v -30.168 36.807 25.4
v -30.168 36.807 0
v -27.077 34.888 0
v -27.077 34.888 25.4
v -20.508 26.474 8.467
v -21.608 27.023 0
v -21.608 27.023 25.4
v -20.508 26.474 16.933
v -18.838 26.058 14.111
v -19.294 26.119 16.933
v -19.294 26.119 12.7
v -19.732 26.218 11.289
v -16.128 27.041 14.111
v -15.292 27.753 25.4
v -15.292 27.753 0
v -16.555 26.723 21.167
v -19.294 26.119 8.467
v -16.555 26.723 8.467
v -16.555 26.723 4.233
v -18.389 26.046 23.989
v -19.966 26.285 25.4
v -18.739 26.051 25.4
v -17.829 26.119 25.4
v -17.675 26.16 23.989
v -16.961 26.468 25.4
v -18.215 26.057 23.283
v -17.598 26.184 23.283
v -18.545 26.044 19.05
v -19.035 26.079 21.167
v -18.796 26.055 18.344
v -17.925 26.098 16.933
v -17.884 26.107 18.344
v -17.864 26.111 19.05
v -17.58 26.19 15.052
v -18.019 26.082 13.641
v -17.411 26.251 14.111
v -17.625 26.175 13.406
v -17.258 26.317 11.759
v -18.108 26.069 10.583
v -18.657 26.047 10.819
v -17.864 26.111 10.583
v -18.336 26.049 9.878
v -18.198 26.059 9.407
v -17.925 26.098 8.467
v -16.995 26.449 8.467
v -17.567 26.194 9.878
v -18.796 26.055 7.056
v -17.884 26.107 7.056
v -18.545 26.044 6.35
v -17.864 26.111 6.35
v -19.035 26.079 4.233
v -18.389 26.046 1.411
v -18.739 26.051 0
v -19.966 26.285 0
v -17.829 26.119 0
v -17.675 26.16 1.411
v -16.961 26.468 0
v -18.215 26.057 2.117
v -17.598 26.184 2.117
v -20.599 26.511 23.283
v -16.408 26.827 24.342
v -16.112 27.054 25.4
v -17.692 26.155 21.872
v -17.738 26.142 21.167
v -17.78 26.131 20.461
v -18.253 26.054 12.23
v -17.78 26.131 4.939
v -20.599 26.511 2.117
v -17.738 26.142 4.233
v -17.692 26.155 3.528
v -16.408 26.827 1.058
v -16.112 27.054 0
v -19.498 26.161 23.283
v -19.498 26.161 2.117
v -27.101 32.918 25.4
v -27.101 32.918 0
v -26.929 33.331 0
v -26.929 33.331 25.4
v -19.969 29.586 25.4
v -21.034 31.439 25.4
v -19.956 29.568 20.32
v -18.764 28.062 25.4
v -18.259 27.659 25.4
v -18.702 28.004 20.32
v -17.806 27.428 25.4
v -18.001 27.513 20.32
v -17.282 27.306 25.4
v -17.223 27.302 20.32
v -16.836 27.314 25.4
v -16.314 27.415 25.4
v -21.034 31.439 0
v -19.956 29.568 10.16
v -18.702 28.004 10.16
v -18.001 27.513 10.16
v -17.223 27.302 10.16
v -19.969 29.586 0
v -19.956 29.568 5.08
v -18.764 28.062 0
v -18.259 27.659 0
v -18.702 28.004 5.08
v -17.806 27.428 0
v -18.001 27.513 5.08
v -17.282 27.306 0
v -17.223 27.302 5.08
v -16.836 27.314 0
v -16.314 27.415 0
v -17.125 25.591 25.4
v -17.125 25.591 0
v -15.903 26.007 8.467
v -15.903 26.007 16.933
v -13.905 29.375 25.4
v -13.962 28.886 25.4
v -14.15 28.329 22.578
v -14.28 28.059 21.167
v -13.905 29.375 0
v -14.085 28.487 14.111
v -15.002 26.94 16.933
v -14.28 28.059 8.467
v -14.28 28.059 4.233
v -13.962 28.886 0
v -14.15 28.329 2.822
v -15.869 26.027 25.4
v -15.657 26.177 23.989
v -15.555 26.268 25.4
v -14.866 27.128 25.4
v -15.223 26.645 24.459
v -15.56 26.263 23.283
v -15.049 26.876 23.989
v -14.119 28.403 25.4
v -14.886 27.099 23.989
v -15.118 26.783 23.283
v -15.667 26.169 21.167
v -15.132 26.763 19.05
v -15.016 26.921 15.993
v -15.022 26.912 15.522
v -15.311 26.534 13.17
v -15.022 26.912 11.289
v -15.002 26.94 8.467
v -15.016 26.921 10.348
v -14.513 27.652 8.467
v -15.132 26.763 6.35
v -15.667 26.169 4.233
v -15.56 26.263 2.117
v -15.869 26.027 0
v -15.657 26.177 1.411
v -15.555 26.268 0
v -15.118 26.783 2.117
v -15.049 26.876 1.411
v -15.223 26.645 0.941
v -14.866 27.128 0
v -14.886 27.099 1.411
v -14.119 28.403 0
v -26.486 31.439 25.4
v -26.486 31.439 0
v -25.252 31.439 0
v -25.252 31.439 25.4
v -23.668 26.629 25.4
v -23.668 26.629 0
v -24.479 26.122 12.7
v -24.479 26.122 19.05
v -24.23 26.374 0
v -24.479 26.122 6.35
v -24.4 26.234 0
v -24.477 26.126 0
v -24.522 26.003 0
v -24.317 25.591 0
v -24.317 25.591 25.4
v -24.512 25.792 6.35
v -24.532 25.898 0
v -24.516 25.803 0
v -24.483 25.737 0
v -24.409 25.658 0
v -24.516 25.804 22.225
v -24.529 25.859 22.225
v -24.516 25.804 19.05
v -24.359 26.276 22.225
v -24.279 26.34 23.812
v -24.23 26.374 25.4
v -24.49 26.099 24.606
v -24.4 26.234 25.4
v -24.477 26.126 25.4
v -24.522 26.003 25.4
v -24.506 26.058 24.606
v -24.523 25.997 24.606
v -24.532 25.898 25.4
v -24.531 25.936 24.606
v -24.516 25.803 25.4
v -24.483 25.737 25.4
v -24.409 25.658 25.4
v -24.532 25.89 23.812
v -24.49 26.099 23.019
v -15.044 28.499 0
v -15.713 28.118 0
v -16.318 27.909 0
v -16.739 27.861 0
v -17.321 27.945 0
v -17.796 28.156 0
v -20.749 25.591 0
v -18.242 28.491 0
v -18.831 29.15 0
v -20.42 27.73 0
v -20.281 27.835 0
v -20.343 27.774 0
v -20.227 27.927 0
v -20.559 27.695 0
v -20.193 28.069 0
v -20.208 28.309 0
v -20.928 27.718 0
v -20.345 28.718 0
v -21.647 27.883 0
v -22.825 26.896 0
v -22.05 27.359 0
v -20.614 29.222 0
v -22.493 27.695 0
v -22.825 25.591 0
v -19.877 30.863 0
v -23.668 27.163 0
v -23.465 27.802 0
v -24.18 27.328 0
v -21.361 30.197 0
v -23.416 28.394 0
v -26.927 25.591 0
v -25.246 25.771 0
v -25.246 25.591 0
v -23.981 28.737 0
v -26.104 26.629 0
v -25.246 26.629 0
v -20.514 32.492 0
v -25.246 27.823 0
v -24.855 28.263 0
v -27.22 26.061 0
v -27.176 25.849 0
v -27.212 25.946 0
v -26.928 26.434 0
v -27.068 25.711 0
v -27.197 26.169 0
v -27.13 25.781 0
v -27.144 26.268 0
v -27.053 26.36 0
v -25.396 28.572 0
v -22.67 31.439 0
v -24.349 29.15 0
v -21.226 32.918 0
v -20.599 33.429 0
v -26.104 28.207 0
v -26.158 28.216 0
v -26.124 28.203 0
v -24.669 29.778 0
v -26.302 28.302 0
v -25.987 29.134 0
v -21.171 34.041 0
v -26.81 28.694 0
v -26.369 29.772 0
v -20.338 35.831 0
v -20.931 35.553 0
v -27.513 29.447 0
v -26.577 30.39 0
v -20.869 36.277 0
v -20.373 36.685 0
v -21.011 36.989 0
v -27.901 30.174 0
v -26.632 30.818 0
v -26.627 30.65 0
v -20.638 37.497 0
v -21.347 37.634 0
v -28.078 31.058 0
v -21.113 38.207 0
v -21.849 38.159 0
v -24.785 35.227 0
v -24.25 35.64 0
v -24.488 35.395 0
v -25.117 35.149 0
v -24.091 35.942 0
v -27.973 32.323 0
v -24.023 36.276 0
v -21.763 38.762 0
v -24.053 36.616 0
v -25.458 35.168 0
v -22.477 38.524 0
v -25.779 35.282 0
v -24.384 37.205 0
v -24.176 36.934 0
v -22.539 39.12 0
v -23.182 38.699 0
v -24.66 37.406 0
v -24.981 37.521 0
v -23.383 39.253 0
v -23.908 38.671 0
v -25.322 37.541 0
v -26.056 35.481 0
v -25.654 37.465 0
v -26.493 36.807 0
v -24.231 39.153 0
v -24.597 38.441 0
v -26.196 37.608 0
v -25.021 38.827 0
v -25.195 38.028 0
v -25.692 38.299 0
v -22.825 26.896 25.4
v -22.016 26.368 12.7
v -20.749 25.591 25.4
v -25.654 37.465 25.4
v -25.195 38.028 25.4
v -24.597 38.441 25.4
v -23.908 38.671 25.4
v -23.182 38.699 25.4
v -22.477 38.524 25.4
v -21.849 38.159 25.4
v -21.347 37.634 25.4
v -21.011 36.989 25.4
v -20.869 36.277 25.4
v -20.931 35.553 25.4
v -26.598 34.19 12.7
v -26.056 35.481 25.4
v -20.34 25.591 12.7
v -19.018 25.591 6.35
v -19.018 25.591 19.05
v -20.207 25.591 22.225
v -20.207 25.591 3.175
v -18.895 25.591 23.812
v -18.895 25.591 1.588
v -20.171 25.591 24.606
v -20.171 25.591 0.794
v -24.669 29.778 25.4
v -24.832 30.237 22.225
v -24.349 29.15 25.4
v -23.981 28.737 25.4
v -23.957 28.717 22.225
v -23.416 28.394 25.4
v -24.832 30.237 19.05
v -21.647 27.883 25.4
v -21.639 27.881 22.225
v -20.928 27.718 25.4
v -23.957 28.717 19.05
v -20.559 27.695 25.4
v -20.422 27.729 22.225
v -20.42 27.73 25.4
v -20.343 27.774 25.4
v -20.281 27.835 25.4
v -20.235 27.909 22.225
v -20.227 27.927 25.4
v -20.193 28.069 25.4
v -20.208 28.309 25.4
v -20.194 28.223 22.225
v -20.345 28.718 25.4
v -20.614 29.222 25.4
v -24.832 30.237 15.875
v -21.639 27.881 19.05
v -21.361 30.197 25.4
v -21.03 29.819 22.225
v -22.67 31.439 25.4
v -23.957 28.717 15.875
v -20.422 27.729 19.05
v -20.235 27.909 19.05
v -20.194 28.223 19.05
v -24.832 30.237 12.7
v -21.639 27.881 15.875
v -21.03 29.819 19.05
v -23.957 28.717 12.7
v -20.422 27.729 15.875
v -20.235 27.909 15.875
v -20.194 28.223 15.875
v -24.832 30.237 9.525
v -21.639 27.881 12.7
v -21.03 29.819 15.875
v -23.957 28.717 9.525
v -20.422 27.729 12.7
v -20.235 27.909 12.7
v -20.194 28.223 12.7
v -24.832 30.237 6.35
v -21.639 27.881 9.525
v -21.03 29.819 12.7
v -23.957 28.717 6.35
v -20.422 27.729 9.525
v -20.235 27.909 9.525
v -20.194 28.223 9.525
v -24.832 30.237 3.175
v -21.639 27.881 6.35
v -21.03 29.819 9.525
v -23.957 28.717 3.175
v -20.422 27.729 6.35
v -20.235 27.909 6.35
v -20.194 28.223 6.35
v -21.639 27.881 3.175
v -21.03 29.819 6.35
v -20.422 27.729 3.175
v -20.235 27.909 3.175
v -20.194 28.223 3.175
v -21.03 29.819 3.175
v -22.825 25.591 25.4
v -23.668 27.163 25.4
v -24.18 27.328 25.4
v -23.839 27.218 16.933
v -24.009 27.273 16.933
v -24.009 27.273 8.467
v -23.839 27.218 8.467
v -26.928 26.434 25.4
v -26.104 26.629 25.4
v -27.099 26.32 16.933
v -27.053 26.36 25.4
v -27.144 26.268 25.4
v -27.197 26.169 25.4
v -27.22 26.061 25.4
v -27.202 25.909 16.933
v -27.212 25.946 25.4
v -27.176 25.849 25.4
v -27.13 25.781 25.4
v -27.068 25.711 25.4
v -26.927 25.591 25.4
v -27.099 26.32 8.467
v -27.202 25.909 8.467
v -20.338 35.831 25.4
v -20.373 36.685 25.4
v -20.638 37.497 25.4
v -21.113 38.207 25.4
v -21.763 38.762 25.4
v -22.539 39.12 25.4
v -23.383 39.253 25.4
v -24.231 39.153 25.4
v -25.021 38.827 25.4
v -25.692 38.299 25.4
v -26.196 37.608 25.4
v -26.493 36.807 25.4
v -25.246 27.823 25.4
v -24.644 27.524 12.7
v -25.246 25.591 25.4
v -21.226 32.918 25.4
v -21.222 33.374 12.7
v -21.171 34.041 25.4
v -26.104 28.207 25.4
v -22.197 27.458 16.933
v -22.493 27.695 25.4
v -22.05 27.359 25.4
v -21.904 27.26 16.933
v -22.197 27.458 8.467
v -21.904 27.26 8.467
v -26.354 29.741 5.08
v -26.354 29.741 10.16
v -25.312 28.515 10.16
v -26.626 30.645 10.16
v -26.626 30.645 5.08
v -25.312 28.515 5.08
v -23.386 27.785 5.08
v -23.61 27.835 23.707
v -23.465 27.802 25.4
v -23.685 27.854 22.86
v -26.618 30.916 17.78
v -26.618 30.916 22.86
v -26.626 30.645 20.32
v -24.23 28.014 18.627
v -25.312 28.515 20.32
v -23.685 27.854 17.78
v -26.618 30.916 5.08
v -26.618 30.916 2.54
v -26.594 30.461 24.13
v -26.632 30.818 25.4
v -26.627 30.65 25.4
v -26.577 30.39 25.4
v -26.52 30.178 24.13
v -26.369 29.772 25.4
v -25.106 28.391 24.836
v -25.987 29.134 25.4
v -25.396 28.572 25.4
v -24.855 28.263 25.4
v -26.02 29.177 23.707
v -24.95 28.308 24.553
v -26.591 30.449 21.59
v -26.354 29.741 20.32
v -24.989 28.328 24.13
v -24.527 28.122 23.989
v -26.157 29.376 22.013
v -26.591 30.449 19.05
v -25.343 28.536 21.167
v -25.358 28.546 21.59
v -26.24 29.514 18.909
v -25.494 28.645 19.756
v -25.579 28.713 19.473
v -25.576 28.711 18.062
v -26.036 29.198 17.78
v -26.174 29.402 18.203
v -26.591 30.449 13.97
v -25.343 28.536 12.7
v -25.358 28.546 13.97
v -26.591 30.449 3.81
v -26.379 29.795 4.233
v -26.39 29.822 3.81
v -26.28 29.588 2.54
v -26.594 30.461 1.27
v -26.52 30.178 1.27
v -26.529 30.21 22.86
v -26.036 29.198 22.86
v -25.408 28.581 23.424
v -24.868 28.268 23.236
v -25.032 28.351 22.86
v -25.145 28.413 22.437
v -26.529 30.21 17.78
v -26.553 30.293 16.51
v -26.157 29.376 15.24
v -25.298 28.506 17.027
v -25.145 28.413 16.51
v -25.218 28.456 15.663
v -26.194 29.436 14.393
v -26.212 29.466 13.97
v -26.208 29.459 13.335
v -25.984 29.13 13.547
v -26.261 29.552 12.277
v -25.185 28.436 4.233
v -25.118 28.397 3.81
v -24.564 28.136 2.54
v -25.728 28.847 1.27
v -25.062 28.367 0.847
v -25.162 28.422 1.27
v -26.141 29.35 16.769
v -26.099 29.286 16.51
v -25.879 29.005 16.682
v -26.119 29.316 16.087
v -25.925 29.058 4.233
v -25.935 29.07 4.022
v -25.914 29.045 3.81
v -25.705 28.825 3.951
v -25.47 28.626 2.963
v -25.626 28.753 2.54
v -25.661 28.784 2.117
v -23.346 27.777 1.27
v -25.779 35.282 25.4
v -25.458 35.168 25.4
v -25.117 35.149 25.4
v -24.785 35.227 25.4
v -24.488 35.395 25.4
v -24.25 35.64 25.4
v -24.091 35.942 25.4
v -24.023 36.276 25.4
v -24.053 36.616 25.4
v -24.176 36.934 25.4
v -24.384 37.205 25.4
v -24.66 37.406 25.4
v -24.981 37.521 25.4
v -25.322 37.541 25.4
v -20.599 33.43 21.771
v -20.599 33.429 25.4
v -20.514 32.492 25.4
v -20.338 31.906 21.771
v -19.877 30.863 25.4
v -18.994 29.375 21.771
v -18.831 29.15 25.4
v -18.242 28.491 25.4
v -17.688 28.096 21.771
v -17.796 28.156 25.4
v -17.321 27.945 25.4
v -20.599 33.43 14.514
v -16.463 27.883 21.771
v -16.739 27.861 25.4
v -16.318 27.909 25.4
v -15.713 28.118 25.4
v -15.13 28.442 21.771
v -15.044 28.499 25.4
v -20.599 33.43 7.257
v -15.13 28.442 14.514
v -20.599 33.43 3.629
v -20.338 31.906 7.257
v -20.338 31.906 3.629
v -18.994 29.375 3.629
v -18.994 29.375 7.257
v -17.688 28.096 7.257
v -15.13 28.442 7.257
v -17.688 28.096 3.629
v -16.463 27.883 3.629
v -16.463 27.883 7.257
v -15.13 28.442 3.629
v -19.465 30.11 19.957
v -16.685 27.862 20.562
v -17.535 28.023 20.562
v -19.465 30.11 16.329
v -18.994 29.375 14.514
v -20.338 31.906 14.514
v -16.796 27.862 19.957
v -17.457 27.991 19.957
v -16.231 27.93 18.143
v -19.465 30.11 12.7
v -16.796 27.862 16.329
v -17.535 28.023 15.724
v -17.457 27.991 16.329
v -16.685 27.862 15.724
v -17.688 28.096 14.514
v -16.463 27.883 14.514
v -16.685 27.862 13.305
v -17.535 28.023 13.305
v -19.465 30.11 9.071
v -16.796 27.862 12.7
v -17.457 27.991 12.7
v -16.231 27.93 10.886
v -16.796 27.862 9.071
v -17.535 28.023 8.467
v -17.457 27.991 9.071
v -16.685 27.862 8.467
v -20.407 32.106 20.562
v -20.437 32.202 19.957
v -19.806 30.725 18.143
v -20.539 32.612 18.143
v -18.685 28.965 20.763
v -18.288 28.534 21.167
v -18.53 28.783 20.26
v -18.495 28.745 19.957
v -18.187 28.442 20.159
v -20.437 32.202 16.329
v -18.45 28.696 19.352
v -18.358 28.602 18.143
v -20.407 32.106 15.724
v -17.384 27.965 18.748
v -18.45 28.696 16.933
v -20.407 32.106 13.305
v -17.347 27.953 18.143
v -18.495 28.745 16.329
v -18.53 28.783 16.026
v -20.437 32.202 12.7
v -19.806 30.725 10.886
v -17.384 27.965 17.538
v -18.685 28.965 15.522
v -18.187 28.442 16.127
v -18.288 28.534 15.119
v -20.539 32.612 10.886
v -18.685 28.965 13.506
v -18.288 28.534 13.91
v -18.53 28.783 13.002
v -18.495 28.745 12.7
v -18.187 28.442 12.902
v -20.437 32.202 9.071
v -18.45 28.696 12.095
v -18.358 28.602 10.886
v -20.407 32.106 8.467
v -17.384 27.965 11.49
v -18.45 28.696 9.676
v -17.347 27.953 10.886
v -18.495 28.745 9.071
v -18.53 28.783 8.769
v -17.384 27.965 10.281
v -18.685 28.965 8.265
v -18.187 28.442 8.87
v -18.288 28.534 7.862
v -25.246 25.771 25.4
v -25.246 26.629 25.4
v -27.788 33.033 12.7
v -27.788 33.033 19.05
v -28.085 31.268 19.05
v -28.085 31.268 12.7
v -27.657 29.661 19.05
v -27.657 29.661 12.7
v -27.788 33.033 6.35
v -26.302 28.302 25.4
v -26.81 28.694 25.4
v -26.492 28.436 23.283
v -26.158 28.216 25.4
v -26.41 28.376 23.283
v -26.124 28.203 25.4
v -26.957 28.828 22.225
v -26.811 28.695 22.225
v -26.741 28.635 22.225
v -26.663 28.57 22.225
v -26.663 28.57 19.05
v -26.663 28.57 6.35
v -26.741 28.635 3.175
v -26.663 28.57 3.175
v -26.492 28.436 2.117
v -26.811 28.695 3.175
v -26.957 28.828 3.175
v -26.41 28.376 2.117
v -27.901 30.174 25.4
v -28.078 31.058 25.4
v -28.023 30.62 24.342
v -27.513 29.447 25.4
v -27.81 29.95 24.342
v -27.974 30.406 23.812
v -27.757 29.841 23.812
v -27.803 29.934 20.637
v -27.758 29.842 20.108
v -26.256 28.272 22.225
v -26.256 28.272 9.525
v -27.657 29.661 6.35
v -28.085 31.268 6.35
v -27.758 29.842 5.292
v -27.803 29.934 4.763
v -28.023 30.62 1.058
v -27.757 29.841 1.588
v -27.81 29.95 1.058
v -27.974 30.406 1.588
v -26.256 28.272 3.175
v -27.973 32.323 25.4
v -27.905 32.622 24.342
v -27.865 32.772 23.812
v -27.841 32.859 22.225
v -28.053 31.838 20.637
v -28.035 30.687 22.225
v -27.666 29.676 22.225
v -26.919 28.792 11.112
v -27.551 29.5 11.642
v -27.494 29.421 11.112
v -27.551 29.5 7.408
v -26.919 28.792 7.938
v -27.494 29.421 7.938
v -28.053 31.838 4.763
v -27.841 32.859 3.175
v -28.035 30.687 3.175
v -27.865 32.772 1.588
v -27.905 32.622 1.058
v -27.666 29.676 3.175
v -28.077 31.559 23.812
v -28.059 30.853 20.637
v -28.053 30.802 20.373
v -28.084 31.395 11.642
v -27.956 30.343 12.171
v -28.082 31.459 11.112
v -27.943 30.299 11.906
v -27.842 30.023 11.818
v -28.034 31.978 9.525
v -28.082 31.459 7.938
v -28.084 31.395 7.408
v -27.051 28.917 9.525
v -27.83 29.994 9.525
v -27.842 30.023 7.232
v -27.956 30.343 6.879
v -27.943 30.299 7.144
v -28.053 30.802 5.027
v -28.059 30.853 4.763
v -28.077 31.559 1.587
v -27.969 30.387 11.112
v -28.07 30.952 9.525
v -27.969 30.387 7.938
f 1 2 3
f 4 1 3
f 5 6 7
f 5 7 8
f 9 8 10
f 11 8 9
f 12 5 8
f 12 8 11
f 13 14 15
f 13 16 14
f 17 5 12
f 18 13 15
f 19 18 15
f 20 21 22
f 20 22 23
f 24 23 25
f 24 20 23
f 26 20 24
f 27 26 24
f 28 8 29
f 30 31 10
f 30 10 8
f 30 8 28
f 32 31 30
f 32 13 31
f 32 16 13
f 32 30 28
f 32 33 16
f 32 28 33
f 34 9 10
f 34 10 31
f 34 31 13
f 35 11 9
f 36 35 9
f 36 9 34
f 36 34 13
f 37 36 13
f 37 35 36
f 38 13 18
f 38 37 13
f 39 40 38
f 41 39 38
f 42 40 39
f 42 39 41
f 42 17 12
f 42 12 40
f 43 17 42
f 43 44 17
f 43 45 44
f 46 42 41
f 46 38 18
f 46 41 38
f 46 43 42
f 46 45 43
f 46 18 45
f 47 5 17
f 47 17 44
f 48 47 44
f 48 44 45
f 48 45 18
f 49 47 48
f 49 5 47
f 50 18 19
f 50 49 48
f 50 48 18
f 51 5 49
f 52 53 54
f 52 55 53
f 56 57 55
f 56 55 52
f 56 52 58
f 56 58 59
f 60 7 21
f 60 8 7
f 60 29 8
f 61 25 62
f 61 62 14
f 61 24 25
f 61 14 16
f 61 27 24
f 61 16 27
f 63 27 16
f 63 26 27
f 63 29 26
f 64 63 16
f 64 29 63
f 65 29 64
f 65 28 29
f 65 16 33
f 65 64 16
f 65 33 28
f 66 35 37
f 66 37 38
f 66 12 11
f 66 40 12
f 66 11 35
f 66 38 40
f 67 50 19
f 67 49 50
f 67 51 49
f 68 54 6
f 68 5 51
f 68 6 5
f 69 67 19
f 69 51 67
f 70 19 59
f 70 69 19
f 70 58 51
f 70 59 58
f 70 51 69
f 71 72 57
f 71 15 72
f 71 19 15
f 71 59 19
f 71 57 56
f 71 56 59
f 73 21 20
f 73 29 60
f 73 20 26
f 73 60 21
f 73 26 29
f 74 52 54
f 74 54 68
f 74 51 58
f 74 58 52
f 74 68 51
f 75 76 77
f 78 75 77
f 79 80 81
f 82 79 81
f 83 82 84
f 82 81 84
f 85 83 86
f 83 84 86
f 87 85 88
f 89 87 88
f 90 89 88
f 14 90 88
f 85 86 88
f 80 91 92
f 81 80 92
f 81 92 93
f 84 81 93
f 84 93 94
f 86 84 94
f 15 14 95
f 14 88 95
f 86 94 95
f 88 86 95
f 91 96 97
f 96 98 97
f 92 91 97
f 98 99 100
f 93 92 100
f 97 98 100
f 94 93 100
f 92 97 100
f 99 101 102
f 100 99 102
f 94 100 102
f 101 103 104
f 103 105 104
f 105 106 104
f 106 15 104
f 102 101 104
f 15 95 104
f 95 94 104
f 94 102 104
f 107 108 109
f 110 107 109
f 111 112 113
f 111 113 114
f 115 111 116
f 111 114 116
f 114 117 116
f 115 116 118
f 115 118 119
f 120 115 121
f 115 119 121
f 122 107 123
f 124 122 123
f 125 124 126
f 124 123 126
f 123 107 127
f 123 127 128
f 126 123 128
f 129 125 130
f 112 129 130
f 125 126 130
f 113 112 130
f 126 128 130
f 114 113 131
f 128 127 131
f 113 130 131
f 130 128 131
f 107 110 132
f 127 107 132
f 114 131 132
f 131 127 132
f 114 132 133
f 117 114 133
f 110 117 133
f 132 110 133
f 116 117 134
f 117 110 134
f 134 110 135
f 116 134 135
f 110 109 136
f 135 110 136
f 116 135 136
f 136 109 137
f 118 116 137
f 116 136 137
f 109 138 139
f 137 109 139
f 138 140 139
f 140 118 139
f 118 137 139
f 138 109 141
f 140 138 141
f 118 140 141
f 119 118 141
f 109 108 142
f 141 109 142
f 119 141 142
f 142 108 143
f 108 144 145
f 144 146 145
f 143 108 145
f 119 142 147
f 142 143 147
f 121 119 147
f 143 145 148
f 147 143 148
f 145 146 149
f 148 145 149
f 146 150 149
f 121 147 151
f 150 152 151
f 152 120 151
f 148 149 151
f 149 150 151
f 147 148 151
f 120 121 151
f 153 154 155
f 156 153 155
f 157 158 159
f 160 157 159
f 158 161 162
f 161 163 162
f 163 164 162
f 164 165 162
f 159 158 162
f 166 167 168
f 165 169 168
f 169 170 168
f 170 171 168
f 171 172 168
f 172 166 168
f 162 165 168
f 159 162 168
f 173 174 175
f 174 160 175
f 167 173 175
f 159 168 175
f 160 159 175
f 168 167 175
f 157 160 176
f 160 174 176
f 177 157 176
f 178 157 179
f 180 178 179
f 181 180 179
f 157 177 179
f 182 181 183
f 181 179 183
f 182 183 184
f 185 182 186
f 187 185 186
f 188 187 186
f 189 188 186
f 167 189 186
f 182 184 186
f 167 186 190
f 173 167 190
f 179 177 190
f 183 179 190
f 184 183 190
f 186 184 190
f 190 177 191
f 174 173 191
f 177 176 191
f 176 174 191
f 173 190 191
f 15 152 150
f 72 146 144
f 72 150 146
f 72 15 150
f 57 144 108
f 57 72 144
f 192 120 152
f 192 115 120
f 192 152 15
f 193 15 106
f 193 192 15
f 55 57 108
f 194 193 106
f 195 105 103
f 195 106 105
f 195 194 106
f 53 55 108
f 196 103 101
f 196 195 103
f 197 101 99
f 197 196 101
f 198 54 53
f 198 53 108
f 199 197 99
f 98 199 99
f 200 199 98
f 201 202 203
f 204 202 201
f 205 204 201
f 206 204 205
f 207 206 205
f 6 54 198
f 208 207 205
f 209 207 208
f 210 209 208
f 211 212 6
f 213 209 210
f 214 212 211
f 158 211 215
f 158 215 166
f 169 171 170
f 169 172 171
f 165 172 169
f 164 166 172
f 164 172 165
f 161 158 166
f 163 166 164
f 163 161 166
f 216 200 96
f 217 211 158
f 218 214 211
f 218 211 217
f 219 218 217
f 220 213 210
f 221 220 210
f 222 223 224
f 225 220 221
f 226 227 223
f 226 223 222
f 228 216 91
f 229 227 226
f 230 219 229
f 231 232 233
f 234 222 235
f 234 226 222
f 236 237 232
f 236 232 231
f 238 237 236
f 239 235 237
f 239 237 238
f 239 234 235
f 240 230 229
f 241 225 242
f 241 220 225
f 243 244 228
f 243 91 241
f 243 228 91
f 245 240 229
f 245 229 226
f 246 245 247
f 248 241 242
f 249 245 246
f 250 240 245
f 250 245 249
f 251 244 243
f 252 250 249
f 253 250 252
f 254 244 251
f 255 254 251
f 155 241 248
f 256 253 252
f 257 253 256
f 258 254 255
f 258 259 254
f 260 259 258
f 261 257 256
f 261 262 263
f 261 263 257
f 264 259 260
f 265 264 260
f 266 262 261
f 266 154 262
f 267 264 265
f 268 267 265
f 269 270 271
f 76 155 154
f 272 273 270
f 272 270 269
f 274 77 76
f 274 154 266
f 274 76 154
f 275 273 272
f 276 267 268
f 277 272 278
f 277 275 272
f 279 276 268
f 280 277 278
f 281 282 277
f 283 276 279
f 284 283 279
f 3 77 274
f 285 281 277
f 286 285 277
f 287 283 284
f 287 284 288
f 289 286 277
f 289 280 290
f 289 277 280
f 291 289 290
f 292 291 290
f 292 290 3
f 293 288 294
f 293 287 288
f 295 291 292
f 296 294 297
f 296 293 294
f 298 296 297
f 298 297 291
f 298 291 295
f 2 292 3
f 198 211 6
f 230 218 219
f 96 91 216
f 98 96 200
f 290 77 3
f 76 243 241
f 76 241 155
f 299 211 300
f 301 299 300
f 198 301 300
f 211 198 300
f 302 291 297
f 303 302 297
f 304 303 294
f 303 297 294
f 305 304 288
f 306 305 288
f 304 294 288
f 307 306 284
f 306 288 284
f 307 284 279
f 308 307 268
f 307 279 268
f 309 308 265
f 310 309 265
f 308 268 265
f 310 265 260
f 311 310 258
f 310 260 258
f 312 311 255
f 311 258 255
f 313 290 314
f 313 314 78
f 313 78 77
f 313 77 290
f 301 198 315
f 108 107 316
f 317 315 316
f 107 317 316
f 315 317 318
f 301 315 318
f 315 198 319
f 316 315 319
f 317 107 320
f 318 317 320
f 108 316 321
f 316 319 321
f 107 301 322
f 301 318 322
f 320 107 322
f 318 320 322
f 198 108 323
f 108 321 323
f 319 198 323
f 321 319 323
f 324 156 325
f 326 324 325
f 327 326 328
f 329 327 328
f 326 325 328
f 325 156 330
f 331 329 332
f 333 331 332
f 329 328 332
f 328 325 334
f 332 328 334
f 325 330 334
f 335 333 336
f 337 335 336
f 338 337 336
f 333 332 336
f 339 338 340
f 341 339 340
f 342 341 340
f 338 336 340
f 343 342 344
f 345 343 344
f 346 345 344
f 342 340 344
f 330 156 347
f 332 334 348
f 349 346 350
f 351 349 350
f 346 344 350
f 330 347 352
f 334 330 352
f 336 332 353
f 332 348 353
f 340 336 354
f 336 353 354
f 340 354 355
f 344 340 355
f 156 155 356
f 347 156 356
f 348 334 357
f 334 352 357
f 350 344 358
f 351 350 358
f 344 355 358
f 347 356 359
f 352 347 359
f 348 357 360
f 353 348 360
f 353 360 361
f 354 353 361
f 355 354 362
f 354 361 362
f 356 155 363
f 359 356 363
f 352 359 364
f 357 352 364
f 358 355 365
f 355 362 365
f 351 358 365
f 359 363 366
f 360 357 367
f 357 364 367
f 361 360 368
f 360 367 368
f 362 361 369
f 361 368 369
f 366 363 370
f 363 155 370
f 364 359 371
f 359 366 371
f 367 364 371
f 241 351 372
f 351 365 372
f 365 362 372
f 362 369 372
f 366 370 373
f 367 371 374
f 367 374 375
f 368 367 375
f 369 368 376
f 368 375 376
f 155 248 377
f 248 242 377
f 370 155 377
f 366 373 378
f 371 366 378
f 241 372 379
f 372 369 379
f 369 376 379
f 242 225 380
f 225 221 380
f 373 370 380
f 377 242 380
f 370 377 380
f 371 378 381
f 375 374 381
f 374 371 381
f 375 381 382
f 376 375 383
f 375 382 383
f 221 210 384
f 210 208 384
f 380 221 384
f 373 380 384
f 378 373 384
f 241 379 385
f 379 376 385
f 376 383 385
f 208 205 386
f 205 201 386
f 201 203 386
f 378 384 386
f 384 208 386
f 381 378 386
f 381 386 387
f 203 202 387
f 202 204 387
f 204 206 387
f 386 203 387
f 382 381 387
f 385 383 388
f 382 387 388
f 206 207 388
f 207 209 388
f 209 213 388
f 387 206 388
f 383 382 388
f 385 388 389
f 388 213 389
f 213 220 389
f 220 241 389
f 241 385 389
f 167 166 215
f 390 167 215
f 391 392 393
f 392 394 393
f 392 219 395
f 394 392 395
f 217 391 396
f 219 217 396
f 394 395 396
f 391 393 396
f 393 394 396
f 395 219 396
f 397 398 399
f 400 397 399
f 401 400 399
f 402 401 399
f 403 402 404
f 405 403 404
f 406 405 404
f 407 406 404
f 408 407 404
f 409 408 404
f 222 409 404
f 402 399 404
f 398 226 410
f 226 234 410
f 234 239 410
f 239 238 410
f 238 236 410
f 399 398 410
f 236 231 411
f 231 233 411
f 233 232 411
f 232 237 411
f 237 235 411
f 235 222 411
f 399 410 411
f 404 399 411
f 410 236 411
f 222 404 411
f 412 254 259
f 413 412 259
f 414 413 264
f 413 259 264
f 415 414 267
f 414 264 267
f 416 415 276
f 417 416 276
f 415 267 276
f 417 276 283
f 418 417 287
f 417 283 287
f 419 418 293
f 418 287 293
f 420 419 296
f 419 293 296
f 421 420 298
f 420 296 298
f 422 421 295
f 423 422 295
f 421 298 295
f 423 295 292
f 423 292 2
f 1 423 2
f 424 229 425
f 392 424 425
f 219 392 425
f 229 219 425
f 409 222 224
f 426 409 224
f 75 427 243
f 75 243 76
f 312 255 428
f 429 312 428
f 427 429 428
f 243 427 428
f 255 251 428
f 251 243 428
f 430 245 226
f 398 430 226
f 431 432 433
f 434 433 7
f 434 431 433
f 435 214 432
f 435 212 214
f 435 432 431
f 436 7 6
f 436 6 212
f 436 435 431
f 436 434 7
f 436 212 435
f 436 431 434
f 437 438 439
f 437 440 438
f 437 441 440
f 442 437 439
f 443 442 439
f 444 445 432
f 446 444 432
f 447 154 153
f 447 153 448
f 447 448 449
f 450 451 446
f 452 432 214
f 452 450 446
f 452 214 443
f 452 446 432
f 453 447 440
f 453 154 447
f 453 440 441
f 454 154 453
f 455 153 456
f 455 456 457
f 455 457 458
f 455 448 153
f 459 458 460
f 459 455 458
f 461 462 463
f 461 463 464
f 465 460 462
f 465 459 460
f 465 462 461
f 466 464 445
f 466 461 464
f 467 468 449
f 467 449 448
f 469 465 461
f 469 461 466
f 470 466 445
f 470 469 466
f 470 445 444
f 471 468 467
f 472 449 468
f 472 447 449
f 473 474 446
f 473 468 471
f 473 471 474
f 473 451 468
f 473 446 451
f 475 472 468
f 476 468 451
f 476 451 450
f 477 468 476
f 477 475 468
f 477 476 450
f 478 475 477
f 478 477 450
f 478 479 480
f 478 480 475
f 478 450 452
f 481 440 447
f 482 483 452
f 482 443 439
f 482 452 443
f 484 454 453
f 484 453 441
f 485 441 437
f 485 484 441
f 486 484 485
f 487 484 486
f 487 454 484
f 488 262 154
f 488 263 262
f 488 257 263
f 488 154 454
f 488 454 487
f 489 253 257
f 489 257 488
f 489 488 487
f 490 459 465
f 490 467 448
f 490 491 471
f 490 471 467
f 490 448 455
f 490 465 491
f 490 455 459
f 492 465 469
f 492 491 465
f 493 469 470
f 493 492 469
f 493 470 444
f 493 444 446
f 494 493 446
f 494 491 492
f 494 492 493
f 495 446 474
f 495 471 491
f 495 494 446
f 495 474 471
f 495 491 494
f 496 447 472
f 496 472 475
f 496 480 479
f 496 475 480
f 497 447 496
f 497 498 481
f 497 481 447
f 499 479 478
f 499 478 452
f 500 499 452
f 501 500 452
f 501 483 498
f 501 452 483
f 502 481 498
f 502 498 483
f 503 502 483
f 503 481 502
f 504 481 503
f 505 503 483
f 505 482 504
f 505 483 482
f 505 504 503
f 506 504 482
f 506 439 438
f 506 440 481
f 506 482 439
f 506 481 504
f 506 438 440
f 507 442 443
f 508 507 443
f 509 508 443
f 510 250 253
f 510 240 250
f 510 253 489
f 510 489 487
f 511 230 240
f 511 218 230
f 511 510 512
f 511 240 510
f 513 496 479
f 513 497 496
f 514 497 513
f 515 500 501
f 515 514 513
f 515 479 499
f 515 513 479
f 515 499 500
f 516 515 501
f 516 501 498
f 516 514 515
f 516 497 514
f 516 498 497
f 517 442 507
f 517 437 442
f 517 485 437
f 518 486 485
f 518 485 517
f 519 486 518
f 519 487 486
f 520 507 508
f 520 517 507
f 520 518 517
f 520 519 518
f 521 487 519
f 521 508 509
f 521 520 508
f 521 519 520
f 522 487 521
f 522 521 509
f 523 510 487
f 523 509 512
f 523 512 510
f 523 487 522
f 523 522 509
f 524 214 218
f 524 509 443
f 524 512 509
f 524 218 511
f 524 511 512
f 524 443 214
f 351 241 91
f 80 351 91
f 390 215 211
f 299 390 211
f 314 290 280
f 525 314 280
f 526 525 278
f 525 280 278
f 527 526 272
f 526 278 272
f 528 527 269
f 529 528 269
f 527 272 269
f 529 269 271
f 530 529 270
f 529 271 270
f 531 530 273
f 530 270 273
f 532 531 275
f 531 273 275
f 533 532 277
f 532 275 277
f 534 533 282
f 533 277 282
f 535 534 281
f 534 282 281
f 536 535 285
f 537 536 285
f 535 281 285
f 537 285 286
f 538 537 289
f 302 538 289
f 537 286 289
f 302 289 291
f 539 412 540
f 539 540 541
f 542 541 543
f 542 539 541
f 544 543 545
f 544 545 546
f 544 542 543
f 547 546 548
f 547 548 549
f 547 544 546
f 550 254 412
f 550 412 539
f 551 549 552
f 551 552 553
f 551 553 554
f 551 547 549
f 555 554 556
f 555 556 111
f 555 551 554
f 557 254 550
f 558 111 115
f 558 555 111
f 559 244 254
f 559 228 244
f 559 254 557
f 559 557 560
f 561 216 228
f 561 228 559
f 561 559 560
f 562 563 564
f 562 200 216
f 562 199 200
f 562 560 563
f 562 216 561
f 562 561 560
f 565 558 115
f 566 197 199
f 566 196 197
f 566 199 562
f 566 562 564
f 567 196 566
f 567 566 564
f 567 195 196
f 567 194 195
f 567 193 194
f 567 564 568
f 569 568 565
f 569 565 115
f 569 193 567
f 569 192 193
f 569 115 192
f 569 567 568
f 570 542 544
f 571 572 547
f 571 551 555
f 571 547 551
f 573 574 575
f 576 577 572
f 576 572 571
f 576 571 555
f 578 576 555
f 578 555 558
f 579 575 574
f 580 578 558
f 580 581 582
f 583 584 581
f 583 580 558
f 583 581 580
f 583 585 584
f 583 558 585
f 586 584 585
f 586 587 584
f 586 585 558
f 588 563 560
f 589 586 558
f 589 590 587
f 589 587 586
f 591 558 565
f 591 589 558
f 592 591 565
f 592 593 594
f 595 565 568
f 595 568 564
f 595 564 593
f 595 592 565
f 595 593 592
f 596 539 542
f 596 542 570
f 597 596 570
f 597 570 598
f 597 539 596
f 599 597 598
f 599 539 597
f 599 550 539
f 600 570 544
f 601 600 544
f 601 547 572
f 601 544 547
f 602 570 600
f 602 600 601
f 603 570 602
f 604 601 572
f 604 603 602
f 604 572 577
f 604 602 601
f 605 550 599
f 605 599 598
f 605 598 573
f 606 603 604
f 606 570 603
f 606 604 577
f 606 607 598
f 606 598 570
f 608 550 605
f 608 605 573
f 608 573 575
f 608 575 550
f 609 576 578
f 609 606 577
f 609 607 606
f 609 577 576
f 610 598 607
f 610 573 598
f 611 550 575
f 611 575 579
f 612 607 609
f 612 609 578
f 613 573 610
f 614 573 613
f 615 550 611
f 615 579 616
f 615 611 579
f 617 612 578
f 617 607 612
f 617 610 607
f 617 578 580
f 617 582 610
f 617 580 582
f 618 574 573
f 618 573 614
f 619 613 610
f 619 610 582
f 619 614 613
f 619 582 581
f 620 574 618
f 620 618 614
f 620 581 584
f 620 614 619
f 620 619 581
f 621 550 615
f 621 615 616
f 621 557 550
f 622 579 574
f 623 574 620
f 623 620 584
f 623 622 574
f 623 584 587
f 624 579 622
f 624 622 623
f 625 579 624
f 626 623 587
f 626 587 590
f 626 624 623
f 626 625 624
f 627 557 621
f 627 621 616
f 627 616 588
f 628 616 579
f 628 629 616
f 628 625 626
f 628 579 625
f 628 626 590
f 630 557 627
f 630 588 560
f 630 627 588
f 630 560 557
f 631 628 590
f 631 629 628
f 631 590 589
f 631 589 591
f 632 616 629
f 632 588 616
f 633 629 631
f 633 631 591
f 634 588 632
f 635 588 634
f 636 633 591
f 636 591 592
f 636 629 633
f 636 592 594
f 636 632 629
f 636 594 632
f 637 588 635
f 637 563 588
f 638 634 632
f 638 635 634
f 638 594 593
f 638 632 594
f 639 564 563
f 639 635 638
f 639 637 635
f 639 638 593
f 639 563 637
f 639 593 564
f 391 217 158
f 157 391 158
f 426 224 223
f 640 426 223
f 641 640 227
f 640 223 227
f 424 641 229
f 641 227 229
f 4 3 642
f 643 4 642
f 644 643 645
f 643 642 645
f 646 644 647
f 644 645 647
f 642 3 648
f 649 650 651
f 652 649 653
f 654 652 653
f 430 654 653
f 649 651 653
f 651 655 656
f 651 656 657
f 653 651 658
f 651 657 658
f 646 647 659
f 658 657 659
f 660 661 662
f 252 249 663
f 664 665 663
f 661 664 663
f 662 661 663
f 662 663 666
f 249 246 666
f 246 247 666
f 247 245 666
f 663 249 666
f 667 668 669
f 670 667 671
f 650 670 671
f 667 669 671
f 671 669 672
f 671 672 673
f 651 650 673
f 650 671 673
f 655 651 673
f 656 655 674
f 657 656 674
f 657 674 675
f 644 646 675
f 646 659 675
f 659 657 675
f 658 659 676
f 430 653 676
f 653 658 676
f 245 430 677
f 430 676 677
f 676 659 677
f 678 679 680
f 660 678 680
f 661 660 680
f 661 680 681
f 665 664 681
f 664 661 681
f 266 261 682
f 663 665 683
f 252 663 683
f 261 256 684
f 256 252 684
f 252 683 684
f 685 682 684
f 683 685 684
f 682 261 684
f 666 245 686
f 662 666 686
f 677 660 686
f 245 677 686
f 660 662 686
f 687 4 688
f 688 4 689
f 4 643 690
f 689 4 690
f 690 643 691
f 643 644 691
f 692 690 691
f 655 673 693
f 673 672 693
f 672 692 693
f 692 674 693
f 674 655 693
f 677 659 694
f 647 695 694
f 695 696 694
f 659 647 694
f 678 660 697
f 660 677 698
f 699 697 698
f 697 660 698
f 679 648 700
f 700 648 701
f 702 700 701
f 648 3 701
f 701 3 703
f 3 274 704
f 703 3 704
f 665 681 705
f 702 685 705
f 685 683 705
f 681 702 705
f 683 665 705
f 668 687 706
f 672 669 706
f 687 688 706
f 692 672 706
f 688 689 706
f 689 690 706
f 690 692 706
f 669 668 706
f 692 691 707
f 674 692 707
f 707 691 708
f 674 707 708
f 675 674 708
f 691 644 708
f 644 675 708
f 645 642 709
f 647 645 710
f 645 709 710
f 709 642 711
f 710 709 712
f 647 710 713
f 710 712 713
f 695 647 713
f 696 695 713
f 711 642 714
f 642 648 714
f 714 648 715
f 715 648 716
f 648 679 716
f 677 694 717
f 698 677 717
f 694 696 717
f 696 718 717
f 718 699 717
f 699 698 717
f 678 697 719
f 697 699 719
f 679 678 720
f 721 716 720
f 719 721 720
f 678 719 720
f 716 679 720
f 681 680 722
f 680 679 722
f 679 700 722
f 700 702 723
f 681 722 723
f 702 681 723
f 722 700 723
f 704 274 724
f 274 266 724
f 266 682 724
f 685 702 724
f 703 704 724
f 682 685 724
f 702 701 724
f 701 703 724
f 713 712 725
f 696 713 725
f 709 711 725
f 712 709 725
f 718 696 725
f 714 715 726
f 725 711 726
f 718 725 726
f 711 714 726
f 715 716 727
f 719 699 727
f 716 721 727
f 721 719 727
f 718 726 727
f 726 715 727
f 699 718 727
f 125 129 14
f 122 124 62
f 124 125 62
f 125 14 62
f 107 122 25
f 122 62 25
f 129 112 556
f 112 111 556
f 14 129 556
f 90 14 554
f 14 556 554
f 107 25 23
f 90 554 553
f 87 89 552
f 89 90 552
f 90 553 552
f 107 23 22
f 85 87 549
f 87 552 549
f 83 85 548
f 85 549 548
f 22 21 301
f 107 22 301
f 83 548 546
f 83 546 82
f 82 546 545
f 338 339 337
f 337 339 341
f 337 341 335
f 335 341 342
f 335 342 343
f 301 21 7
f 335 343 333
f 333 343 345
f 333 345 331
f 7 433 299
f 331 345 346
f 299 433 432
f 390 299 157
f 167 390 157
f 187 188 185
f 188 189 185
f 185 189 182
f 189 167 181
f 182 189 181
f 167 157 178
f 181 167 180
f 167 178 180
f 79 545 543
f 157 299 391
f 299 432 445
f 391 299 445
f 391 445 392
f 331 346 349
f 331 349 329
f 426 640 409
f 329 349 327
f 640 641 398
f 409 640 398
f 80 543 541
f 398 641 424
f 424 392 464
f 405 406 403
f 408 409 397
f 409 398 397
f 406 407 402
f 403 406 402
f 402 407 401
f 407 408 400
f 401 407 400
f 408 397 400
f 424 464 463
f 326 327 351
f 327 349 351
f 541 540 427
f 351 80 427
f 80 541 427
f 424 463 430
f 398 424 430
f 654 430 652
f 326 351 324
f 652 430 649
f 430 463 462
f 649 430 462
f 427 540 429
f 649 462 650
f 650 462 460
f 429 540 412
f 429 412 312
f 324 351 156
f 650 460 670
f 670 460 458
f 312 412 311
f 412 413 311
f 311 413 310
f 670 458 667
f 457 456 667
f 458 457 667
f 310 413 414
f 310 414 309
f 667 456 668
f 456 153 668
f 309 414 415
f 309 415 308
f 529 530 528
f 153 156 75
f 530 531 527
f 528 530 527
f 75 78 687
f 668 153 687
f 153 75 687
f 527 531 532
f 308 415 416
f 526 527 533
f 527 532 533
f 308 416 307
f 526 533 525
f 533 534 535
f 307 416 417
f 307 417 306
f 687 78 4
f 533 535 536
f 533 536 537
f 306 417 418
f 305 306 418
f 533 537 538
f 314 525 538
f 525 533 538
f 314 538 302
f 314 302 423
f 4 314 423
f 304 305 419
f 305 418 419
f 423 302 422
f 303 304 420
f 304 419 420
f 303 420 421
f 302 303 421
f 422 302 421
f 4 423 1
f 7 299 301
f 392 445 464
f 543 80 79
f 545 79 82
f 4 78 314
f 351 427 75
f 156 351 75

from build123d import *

# Parameters (mm, degrees)
F1_DEPTH = 25.4


with BuildPart() as f1:
    # F0 (on Top) → F1 (new body)
    with BuildSketch(Plane.XY):
        with BuildLine():
            add(Edge.make_bspline(
                [(-20.3382612037, 35.8313347316), (-20.4450111683, 34.9358050979), (-20.6956038594, 33.4295119082), (-20.4520091655, 31.8862395133), (-19.0946101464, 29.3170291608), (-17.8111689332, 27.9825807986), (-16.4324991862, 27.7419027231), (-15.0794261509, 28.4031430479), (-14.2998902994, 29.0480302806), (-13.904822059, 29.3747521937)],
                knots=[0, 0, 0, 0, 0.1653037084, 0.2975853738, 0.4776663545, 0.6214793879, 0.7401281155, 0.8679936909, 1, 1, 1, 1], degree=3))
            ThreePointArc((-20.3382612037, 35.8313347316), (-22.9562506508, 39.2154729726), (-26.4925179517, 36.8069310992))
            Line((-26.4925179517, 36.8069310992), (-26.5022447151, 36.8069310992))
            add(Edge.make_bspline(
                [(-26.5022447151, 36.8069310992), (-26.5819130783, 36.1808218197), (-26.8148696335, 35.5395069688), (-27.0769987784, 34.8878260057)],
                knots=[0, 0, 0, 0, 0.1885118186, 0.1885118186, 0.1885118186, 0.1885118186], degree=3))
            add(Edge.make_bspline(
                [(-27.0769987784, 34.8878260057), (-27.3225638709, 34.2773250402), (-28.1095019562, 32.4792264142), (-28.326739249, 29.6855427651), (-26.1714588887, 28.1815095827), (-26.1127384914, 28.2024321762), (-26.1040050536, 28.2070487738)],
                knots=[0.1885118186, 0.1885118186, 0.1885118186, 0.1885118186, 0.365111495, 0.7010109468, 0.966132419, 1, 1, 1, 1], degree=3))
            Line((-26.1040050536, 28.2070487738), (-26.1040050536, 26.6290362924))
            add(Edge.make_bspline(
                [(-26.1040050536, 26.6290362924), (-26.50786087, 26.5663915047), (-27.1725068155, 26.4619725648), (-27.2738381155, 25.8754369894), (-27.0432563694, 25.6828019605), (-26.9273165613, 25.5914572626)],
                knots=[0, 0, 0, 0, 0.4399850766, 0.7208050242, 1, 1, 1, 1], degree=3))
            Line((-26.9273165613, 25.5914572626), (-25.2463910729, 25.5914572626))
            Line((-25.2463910729, 25.5914572626), (-25.2463910729, 25.771420449))
            add(Edge.make_bspline(
                [(-25.2463910729, 26.6290362924), (-25.2463910729, 26.3431643446), (-25.2463910729, 26.0572923968), (-25.2463910729, 25.771420449)],
                knots=[0, 0, 0, 0, 0.8576158434, 0.8576158434, 0.8576158434, 0.8576158434], degree=3))
            Line((-25.2463910729, 26.6290362924), (-25.2463910729, 27.8230719268))
            add(Edge.make_bspline(
                [(-25.2463910729, 27.8230719268), (-25.0259420337, 27.7154537877), (-24.6676994209, 27.5206856825), (-24.3170251754, 27.3869259749), (-24.1801459342, 27.3284353316)],
                knots=[0, 0, 0, 0, 0.5361258831, 1, 1, 1, 1], degree=3))
            add(Edge.make_bspline(
                [(-24.1801459342, 27.3284353316), (-24.0093345443, 27.27341714), (-23.8385231545, 27.2183989485), (-23.6677117646, 27.163380757)],
                knots=[0, 0, 0, 0, 0.5383602798, 0.5383602798, 0.5383602798, 0.5383602798], degree=3))
            Line((-23.6677117646, 27.163380757), (-23.6677117646, 26.6290362924))
            add(Edge.make_bspline(
                [(-23.6677117646, 26.6290362924), (-23.8486112672, 26.5599101731), (-24.1839606126, 26.4320640725), (-24.5156260038, 26.159992966), (-24.5633962408, 25.7689710346), (-24.4001932512, 25.6449799988), (-24.3170251754, 25.5914572626)],
                knots=[0, 0, 0, 0, 0.3002488033, 0.5568370832, 0.7879058054, 1, 1, 1, 1], degree=3))
            Line((-24.3170251754, 25.5914572626), (-22.8249467909, 25.5914572626))
            Line((-22.8249467909, 25.5914572626), (-22.8249467909, 26.6290362924))
            Line((-22.8249467909, 26.6290362924), (-22.8249467909, 26.8962085247))
            add(Edge.make_bspline(
                [(-22.8249467909, 26.8962085247), (-22.5713066122, 26.7276144339), (-22.0028986749, 26.3497948791), (-21.195758956, 25.8617321727), (-20.7487884909, 25.5914572626)],
                knots=[0, 0, 0, 0, 0.446229129, 1, 1, 1, 1], degree=3))
            add(Edge.make_bspline(
                [(-20.7487884909, 25.5914572626), (-20.6447985865, 25.5914572626), (-20.2492258993, 25.5914572626), (-18.450568256, 25.5914572626), (-17.1247497201, 25.5914572626)],
                knots=[0, 0, 0, 0, 0.26288444, 1, 1, 1, 1], degree=3))
            add(Edge.make_bspline(
                [(-17.1247497201, 25.5914572626), (-16.7304722372, 25.6996906729), (-15.7777839891, 25.9141544333), (-14.9929303539, 26.9268449842), (-13.8994103483, 28.4848795653), (-13.904822059, 29.3747521937)],
                knots=[0, 0, 0, 0, 0.2906764391, 0.5819576128, 1, 1, 1, 1], degree=3))
        make_face()
        with BuildLine():
            Line((-22.6698517799, 31.4386411512), (-21.0337025163, 31.4386411512))
            add(Edge.make_bspline(
                [(-21.0337025163, 31.4386411512), (-20.8902139077, 31.1323245172), (-20.5931961172, 30.4982568329), (-19.948402137, 29.5555814465), (-18.8033343493, 27.8881326011), (-17.2274089816, 27.0450525014), (-15.957345343, 27.5098448702), (-15.2919646353, 27.753347531)],
                knots=[0, 0, 0, 0, 0.1624195956, 0.3362044547, 0.5652089994, 0.772214923, 1, 1, 1, 1], degree=3))
            add(Edge.make_bspline(
                [(-21.6075759381, 27.0229037851), (-21.2921258199, 26.8415588149), (-20.5169526668, 26.3959297147), (-17.7138645688, 25.6180239971), (-16.1224872042, 27.0210982904), (-15.2919646353, 27.753347531)],
                knots=[0, 0, 0, 0, 0.2470261496, 0.6070311225, 1, 1, 1, 1], degree=3))
            add(Edge.make_bspline(
                [(-22.4931623569, 27.695426443), (-22.1939764772, 27.4138094891), (-21.9067618178, 27.3045207391), (-21.6075759381, 27.0229037851)],
                knots=[0, 0, 0, 0, 1.1120027116, 1.1120027116, 1.1120027116, 1.1120027116], degree=3))
            add(Edge.make_bspline(
                [(-26.4862797308, 31.4386411512), (-26.6259402071, 30.9096946323), (-26.6783712453, 30.7603514323), (-26.3997968938, 29.6282073765), (-25.4490435424, 28.3489615598), (-23.4013330994, 27.741539672), (-22.7768510314, 27.6881511475), (-22.4931623569, 27.695426443)],
                knots=[0, 0, 0, 0, 0.1625930825, 0.3386475555, 0.5683904873, 0.8284157553, 1, 1, 1, 1], degree=3))
            Line((-26.4862797308, 31.4386411512), (-25.2517569845, 31.4386411512))
            add(Edge.make_bspline(
                [(-25.2517569845, 31.4386411512), (-25.081467778, 31.0305250114), (-24.8474412541, 30.2487875622), (-24.1954181543, 28.3934750124), (-21.7113422378, 27.9363030082), (-20.387241461, 27.5366712966), (-20.0063896806, 28.2928764563), (-21.0142921465, 29.9153907257), (-21.7761724236, 30.57659681), (-22.3482616293, 31.1915019356), (-22.6698517799, 31.4386411512)],
                knots=[0, 0, 0, 0, 0.1205697372, 0.2621090922, 0.4299069649, 0.5482397404, 0.6270841, 0.770560927, 0.8827722027, 1, 1, 1, 1], degree=3))
        make_face(mode=Mode.SUBTRACT)
        with BuildLine():
            ThreePointArc((-25.654328987, 37.4647304416), (-22.4769363023, 38.524071468), (-20.9311007312, 35.5528057326))
            add(Edge.make_bspline(
                [(-20.9311007312, 35.5528057326), (-21.0622856997, 34.8308373887), (-21.2217965052, 33.9606944337), (-21.2295446647, 33.070501474), (-21.2261399372, 32.9183340073)],
                knots=[0, 0, 0, 0, 0.3234940663, 0.3900255115, 0.3900255115, 0.3900255115, 0.3900255115], degree=3))
            Line((-21.2261399372, 32.9183340073), (-22.6698517799, 32.9183340073))
            Line((-22.6698517799, 32.9183340073), (-25.2517569845, 32.9183340073))
            Line((-25.2517569845, 32.9183340073), (-26.4331996441, 32.9183340073))
            Line((-26.4331996441, 32.9183340073), (-27.1009020507, 32.9183340073))
            Line((-27.1009020507, 32.9183340073), (-26.9288700074, 33.3305411041))
            add(Edge.make_bspline(
                [(-26.056057546, 35.4814045858), (-26.2491927806, 35.0294793202), (-26.5989642929, 34.2109348307), (-26.8267870878, 33.6029618535), (-26.9288700074, 33.3305411041)],
                knots=[0.0013306924, 0.0013306924, 0.0013306924, 0.0013306924, 0.5525158988, 1, 1, 1, 1], degree=3))
            ThreePointArc((-26.056057546, 35.4814045858), (-24.0453939283, 36.1064872676), (-25.654328987, 37.4647304416))
        make_face(mode=Mode.SUBTRACT)
        with BuildLine():
            add(Edge.make_bspline(
                [(-26.5022447151, 36.8069310992), (-26.5819130783, 36.1808218197), (-26.8148696335, 35.5395069688), (-27.0769987784, 34.8878260057)],
                knots=[0, 0, 0, 0, 0.1885118186, 0.1885118186, 0.1885118186, 0.1885118186], degree=3))
            Line((-26.5022447151, 36.8069310992), (-30.1676038653, 36.8069310992))
            Line((-30.1676038653, 36.8069310992), (-27.0769987784, 34.8878260057))
        make_face()
    extrude(amount=F1_DEPTH)


solid = f1.part
